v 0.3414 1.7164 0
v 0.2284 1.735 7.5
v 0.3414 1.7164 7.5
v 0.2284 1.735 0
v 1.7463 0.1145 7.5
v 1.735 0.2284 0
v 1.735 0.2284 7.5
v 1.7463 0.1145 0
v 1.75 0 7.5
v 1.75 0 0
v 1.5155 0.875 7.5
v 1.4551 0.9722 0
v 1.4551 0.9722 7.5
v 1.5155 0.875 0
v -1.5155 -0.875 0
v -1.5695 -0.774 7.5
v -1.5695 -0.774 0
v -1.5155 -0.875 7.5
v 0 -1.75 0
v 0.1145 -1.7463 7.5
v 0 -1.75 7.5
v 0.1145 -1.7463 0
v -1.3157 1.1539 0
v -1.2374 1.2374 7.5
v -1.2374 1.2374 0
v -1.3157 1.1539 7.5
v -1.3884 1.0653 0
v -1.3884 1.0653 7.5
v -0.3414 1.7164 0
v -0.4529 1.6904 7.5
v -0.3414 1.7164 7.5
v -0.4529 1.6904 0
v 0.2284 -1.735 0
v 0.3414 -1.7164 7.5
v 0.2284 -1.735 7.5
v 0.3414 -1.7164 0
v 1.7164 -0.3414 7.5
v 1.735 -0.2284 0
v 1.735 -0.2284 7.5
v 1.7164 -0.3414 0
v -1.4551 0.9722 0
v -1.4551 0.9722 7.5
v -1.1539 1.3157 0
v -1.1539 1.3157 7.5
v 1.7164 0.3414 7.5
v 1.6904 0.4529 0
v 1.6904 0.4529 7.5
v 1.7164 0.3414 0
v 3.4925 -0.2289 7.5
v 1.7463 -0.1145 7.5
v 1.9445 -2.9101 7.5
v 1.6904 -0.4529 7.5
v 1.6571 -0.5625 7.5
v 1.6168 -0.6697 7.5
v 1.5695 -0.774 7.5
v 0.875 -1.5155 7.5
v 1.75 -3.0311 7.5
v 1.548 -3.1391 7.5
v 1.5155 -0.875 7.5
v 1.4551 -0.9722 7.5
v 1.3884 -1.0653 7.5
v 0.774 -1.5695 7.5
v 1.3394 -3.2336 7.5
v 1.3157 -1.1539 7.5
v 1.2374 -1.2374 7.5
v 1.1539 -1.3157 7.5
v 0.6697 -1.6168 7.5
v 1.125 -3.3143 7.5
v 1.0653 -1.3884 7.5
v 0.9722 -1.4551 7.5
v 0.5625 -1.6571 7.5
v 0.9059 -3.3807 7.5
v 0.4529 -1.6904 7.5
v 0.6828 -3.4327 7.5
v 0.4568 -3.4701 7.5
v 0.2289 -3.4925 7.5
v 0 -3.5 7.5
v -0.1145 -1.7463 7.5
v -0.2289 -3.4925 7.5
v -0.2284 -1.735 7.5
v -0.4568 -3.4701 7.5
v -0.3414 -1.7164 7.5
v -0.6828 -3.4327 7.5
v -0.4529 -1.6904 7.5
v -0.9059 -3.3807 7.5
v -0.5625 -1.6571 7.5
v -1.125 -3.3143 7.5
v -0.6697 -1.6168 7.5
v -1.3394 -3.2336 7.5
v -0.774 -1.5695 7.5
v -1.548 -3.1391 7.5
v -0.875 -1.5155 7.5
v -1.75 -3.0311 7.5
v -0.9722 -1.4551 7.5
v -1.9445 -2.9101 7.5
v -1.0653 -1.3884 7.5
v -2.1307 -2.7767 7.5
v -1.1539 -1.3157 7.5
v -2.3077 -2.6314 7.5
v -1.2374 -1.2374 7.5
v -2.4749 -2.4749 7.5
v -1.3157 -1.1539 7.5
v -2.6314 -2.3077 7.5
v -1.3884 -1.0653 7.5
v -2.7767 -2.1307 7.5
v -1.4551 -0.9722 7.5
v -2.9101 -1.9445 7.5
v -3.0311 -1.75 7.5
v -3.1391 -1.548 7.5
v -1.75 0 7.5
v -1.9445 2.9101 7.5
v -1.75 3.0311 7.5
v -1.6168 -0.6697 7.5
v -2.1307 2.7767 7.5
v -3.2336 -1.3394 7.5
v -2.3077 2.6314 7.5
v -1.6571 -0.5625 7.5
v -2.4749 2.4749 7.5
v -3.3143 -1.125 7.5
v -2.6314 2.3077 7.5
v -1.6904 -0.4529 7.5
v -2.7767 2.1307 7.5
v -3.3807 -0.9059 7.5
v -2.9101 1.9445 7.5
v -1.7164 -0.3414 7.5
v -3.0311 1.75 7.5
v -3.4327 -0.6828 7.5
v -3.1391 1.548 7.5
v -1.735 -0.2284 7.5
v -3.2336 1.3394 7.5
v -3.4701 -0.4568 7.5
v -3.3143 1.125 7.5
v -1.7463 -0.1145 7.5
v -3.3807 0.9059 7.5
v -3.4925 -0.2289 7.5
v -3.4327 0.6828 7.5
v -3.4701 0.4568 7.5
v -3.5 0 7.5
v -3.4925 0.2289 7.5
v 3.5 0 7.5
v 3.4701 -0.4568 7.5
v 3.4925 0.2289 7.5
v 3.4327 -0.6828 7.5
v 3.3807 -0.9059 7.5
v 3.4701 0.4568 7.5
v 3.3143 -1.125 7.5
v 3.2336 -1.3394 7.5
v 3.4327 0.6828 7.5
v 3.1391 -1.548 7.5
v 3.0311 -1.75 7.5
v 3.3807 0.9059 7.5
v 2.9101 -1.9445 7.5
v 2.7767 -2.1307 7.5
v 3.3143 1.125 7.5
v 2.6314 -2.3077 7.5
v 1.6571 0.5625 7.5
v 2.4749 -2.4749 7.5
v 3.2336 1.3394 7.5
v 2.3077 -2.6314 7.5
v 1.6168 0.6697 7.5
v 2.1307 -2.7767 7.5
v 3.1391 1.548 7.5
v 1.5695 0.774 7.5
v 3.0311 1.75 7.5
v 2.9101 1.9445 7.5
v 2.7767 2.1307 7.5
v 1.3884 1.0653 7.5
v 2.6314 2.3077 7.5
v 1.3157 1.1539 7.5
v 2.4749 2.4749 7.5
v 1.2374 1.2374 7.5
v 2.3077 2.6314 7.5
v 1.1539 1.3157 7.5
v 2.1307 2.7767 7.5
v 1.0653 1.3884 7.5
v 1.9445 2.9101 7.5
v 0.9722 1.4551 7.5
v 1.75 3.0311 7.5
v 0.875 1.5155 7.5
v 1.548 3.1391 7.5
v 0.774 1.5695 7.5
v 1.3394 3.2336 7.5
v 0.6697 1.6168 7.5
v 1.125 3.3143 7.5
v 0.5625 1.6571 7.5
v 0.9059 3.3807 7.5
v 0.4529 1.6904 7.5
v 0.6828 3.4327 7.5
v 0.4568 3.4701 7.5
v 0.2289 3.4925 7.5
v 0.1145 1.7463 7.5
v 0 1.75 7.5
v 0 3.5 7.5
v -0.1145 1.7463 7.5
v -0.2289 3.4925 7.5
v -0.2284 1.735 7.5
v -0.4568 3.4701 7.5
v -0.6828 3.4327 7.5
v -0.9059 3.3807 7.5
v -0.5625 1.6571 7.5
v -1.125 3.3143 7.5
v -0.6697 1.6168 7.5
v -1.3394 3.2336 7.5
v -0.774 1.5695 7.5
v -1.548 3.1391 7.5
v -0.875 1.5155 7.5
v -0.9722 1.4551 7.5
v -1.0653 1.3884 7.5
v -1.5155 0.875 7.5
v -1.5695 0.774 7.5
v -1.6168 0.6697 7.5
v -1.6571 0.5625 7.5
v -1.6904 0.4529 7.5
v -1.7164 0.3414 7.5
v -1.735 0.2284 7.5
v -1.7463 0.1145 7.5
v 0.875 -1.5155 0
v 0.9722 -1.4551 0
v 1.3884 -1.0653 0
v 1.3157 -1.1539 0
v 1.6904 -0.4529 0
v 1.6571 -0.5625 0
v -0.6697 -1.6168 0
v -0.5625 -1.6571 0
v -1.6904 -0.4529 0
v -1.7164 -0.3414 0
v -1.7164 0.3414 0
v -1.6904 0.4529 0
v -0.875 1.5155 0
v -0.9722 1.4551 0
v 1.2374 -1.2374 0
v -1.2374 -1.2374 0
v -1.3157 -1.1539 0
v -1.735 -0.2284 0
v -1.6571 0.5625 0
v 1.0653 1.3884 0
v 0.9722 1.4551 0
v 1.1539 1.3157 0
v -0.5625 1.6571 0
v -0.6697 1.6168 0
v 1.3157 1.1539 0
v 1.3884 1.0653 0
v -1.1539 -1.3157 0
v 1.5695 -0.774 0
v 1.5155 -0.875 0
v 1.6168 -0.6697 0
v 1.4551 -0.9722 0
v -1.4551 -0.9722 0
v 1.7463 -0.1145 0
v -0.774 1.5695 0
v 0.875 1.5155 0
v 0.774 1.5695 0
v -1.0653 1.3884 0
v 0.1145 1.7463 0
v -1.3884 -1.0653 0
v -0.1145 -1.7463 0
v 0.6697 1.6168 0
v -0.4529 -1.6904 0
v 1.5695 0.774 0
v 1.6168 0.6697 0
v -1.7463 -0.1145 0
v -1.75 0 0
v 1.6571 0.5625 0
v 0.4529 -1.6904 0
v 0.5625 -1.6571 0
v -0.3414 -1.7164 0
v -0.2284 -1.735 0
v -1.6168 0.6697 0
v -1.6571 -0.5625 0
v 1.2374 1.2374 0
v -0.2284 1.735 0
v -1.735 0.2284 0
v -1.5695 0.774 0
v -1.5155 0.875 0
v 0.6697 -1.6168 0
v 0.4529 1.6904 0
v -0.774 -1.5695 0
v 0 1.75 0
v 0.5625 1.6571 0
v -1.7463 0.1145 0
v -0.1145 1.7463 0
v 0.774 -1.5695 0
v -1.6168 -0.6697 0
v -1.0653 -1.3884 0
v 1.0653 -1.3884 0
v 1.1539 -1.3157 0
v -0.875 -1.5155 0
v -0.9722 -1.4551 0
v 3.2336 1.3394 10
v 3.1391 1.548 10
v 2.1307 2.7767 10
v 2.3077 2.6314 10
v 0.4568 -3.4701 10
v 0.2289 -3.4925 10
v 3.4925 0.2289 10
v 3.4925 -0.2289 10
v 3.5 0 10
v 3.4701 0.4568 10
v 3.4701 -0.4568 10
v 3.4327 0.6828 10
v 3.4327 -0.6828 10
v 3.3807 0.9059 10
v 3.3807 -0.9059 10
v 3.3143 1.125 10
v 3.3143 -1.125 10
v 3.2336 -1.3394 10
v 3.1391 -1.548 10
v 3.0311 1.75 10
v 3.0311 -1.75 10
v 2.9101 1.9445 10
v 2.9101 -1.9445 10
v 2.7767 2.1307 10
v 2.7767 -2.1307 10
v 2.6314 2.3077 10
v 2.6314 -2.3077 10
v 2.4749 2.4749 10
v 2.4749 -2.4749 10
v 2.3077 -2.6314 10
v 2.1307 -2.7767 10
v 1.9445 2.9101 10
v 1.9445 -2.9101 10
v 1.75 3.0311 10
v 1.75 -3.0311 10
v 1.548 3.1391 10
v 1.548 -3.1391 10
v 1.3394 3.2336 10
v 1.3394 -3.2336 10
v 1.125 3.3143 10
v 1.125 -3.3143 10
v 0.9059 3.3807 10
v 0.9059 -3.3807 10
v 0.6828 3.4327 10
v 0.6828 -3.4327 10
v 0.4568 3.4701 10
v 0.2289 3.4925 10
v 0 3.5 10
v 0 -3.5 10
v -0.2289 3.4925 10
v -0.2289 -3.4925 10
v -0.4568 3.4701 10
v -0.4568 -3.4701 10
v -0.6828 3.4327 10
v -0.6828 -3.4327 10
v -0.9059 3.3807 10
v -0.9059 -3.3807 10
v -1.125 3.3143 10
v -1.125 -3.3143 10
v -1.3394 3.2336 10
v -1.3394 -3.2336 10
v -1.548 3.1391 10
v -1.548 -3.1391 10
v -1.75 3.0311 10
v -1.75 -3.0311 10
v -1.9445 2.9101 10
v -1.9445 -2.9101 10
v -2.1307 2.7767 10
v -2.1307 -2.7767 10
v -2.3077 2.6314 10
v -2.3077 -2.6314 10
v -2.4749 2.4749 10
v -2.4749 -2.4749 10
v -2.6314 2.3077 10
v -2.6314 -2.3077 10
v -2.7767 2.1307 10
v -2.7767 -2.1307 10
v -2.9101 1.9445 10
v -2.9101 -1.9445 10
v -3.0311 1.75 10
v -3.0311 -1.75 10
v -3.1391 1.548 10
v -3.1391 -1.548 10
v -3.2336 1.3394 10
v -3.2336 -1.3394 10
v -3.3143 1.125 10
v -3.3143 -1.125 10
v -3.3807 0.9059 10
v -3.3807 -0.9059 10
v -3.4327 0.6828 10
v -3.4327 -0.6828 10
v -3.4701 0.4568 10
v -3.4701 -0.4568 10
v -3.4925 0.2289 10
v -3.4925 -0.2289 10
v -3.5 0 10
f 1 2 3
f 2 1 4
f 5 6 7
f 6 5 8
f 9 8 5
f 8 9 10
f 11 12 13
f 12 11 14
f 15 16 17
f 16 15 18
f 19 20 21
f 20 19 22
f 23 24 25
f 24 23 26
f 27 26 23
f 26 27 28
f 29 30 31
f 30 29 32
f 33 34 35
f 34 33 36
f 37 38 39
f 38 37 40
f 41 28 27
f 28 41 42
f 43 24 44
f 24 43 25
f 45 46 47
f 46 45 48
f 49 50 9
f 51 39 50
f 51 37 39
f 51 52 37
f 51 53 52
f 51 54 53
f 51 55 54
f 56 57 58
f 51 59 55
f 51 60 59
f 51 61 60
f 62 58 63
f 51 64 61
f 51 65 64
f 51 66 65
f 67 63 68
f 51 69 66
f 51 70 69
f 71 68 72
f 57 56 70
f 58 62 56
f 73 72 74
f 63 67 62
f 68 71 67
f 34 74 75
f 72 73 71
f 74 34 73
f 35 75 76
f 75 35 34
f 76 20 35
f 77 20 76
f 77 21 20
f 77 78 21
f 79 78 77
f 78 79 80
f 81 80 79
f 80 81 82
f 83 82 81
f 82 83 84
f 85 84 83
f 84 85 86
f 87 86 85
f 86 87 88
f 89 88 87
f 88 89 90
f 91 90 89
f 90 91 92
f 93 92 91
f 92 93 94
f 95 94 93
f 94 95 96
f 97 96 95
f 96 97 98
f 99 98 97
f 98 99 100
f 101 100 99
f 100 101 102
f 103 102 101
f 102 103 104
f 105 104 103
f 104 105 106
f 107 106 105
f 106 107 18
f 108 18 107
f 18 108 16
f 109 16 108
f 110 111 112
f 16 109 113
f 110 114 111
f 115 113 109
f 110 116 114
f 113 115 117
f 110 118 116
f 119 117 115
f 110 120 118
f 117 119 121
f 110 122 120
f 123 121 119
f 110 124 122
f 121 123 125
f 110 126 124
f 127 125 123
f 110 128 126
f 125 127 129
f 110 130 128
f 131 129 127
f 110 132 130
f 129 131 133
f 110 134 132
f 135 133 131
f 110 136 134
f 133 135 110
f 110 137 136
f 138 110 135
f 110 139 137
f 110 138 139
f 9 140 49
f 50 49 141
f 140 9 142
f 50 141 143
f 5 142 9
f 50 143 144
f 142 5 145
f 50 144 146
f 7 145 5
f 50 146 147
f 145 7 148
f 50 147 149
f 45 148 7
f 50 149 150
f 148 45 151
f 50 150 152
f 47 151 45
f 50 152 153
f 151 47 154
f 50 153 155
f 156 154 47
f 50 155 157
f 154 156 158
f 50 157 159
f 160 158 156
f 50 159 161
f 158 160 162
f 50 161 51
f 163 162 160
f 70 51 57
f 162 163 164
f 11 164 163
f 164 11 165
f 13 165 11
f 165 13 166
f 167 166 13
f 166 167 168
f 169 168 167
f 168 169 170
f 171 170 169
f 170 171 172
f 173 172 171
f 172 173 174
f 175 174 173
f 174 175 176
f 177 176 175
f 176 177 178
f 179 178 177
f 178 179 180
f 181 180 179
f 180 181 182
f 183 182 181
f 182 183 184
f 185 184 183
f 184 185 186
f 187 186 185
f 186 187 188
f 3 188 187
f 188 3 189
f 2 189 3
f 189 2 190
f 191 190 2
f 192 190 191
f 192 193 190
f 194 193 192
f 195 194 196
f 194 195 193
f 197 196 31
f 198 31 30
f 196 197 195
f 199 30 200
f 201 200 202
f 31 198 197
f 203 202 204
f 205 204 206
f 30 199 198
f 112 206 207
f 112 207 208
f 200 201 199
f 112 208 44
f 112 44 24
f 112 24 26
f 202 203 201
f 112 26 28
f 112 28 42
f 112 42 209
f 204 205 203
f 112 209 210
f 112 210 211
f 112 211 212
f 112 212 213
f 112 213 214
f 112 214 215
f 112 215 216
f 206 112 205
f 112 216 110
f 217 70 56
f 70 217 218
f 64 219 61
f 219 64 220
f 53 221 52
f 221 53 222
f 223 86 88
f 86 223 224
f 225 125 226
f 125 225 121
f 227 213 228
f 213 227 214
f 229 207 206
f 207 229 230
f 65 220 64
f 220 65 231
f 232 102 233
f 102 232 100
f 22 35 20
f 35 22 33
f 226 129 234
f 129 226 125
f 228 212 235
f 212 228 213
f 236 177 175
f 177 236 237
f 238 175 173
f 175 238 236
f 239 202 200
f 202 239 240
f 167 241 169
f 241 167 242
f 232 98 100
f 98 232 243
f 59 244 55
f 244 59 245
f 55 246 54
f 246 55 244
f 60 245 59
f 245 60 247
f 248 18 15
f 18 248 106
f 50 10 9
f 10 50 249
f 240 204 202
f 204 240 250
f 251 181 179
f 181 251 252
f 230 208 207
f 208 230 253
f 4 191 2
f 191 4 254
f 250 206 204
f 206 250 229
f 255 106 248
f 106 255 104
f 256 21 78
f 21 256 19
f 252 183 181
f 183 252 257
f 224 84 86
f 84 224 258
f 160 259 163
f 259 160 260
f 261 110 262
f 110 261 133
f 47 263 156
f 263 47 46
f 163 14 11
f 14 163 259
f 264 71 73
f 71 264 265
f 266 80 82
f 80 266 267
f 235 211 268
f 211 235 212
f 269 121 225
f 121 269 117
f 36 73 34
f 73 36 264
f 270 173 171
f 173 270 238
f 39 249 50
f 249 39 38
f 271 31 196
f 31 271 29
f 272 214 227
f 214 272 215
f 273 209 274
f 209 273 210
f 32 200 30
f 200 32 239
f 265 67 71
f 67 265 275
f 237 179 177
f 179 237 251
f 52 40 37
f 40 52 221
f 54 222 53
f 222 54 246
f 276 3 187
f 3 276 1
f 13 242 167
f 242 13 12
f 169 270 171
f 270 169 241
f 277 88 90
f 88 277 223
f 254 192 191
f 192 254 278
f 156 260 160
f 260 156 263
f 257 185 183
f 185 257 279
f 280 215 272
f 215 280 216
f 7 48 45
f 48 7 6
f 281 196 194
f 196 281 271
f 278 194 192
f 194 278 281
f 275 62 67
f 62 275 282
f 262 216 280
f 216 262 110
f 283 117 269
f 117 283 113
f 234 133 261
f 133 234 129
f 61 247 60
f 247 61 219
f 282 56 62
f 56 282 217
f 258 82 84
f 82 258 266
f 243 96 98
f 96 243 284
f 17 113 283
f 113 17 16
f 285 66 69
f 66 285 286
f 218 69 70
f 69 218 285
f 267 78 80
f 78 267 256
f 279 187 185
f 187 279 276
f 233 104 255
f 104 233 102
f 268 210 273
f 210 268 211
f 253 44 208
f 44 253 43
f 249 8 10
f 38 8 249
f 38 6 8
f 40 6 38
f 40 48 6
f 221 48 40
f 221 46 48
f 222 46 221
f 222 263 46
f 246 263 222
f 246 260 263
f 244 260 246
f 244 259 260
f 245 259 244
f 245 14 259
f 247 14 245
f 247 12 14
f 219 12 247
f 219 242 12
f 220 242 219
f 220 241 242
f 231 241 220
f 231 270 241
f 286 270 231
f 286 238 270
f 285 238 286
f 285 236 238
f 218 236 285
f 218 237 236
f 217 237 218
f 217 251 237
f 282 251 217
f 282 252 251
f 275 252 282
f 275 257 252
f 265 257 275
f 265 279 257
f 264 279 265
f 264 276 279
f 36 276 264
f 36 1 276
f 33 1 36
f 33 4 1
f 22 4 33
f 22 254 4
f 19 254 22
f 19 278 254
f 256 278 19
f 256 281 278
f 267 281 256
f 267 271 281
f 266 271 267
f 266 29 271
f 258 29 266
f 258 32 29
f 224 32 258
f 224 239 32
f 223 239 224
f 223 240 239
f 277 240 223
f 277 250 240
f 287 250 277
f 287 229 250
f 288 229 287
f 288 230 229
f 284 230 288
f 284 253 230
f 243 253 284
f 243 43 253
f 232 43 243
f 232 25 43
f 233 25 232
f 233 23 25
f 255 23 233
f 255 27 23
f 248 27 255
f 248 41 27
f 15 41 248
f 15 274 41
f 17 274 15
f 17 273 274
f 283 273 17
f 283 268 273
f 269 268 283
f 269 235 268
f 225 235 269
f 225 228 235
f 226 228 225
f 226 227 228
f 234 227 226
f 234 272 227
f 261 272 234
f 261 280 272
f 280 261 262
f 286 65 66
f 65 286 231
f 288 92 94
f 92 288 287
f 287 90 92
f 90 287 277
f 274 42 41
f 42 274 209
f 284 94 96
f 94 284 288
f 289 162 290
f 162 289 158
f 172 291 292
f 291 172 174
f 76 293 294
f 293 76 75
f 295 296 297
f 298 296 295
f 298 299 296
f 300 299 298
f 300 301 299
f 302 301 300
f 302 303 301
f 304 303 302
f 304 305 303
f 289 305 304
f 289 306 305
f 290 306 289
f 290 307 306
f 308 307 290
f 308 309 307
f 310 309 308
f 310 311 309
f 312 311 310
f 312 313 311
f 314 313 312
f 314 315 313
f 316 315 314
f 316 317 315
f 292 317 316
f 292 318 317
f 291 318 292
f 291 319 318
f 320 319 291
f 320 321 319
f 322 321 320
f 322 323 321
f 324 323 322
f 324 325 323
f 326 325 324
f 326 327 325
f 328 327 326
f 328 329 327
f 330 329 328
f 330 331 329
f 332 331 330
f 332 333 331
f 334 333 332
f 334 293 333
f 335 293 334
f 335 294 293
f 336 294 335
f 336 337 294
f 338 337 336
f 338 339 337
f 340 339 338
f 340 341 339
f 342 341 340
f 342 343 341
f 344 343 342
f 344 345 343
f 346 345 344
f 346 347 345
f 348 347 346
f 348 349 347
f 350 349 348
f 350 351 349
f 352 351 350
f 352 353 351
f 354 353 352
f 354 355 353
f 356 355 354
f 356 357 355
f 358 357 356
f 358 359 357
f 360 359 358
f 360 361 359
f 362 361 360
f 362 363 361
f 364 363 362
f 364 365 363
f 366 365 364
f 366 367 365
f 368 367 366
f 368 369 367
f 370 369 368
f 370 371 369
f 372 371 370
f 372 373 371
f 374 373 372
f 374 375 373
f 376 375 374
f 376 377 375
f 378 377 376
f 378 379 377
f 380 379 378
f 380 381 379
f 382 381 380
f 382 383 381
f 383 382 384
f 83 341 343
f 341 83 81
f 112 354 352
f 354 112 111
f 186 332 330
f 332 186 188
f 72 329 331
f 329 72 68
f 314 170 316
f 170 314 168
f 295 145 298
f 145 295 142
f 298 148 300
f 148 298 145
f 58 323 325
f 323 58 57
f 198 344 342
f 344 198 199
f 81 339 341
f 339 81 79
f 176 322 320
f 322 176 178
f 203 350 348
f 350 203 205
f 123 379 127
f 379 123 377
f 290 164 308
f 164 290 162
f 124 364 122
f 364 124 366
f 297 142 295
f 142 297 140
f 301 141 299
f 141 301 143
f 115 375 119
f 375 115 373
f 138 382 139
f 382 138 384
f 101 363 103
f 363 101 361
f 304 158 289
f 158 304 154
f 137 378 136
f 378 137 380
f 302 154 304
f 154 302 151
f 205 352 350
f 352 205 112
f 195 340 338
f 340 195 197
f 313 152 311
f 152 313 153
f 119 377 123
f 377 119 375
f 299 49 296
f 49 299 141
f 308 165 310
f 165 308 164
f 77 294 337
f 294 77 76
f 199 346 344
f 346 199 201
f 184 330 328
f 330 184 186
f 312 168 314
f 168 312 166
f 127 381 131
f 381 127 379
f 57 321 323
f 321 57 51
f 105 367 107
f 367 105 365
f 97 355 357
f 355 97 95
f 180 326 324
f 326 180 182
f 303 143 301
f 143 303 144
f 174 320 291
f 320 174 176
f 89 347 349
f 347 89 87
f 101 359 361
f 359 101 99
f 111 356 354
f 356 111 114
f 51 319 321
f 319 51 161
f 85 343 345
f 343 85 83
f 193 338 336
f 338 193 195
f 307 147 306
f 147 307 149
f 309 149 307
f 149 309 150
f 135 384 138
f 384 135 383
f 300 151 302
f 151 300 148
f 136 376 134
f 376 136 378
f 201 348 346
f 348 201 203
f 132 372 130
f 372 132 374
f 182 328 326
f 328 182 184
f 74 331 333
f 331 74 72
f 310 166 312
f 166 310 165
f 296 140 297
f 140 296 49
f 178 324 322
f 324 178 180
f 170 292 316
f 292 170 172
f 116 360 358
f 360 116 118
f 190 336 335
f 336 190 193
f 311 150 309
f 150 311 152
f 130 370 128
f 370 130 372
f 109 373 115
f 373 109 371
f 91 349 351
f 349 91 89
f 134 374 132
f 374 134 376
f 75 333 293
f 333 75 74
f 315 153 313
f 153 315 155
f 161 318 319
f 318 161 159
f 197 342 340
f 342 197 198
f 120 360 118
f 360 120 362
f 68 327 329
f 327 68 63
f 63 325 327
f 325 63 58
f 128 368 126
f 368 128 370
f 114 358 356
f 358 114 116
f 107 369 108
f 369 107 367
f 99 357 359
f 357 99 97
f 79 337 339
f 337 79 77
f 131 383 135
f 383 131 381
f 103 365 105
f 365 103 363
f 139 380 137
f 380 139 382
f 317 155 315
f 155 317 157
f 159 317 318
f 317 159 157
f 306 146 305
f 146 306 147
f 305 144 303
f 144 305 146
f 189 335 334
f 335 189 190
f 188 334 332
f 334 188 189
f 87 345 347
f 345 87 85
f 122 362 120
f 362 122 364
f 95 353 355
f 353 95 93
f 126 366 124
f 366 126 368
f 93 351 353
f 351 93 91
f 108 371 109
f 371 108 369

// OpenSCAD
$fn = 96;

shaft_d = 3.5;
head_d  = 7.0;
length  = 10.0;

head_h = 2.5;                 // simple pan head height
shaft_h = max(0.01, length - head_h);

union() {
  // Shaft
  cylinder(d = shaft_d, h = shaft_h);

  // Head
  translate([0, 0, shaft_h])
    cylinder(d = head_d, h = head_h);
}
